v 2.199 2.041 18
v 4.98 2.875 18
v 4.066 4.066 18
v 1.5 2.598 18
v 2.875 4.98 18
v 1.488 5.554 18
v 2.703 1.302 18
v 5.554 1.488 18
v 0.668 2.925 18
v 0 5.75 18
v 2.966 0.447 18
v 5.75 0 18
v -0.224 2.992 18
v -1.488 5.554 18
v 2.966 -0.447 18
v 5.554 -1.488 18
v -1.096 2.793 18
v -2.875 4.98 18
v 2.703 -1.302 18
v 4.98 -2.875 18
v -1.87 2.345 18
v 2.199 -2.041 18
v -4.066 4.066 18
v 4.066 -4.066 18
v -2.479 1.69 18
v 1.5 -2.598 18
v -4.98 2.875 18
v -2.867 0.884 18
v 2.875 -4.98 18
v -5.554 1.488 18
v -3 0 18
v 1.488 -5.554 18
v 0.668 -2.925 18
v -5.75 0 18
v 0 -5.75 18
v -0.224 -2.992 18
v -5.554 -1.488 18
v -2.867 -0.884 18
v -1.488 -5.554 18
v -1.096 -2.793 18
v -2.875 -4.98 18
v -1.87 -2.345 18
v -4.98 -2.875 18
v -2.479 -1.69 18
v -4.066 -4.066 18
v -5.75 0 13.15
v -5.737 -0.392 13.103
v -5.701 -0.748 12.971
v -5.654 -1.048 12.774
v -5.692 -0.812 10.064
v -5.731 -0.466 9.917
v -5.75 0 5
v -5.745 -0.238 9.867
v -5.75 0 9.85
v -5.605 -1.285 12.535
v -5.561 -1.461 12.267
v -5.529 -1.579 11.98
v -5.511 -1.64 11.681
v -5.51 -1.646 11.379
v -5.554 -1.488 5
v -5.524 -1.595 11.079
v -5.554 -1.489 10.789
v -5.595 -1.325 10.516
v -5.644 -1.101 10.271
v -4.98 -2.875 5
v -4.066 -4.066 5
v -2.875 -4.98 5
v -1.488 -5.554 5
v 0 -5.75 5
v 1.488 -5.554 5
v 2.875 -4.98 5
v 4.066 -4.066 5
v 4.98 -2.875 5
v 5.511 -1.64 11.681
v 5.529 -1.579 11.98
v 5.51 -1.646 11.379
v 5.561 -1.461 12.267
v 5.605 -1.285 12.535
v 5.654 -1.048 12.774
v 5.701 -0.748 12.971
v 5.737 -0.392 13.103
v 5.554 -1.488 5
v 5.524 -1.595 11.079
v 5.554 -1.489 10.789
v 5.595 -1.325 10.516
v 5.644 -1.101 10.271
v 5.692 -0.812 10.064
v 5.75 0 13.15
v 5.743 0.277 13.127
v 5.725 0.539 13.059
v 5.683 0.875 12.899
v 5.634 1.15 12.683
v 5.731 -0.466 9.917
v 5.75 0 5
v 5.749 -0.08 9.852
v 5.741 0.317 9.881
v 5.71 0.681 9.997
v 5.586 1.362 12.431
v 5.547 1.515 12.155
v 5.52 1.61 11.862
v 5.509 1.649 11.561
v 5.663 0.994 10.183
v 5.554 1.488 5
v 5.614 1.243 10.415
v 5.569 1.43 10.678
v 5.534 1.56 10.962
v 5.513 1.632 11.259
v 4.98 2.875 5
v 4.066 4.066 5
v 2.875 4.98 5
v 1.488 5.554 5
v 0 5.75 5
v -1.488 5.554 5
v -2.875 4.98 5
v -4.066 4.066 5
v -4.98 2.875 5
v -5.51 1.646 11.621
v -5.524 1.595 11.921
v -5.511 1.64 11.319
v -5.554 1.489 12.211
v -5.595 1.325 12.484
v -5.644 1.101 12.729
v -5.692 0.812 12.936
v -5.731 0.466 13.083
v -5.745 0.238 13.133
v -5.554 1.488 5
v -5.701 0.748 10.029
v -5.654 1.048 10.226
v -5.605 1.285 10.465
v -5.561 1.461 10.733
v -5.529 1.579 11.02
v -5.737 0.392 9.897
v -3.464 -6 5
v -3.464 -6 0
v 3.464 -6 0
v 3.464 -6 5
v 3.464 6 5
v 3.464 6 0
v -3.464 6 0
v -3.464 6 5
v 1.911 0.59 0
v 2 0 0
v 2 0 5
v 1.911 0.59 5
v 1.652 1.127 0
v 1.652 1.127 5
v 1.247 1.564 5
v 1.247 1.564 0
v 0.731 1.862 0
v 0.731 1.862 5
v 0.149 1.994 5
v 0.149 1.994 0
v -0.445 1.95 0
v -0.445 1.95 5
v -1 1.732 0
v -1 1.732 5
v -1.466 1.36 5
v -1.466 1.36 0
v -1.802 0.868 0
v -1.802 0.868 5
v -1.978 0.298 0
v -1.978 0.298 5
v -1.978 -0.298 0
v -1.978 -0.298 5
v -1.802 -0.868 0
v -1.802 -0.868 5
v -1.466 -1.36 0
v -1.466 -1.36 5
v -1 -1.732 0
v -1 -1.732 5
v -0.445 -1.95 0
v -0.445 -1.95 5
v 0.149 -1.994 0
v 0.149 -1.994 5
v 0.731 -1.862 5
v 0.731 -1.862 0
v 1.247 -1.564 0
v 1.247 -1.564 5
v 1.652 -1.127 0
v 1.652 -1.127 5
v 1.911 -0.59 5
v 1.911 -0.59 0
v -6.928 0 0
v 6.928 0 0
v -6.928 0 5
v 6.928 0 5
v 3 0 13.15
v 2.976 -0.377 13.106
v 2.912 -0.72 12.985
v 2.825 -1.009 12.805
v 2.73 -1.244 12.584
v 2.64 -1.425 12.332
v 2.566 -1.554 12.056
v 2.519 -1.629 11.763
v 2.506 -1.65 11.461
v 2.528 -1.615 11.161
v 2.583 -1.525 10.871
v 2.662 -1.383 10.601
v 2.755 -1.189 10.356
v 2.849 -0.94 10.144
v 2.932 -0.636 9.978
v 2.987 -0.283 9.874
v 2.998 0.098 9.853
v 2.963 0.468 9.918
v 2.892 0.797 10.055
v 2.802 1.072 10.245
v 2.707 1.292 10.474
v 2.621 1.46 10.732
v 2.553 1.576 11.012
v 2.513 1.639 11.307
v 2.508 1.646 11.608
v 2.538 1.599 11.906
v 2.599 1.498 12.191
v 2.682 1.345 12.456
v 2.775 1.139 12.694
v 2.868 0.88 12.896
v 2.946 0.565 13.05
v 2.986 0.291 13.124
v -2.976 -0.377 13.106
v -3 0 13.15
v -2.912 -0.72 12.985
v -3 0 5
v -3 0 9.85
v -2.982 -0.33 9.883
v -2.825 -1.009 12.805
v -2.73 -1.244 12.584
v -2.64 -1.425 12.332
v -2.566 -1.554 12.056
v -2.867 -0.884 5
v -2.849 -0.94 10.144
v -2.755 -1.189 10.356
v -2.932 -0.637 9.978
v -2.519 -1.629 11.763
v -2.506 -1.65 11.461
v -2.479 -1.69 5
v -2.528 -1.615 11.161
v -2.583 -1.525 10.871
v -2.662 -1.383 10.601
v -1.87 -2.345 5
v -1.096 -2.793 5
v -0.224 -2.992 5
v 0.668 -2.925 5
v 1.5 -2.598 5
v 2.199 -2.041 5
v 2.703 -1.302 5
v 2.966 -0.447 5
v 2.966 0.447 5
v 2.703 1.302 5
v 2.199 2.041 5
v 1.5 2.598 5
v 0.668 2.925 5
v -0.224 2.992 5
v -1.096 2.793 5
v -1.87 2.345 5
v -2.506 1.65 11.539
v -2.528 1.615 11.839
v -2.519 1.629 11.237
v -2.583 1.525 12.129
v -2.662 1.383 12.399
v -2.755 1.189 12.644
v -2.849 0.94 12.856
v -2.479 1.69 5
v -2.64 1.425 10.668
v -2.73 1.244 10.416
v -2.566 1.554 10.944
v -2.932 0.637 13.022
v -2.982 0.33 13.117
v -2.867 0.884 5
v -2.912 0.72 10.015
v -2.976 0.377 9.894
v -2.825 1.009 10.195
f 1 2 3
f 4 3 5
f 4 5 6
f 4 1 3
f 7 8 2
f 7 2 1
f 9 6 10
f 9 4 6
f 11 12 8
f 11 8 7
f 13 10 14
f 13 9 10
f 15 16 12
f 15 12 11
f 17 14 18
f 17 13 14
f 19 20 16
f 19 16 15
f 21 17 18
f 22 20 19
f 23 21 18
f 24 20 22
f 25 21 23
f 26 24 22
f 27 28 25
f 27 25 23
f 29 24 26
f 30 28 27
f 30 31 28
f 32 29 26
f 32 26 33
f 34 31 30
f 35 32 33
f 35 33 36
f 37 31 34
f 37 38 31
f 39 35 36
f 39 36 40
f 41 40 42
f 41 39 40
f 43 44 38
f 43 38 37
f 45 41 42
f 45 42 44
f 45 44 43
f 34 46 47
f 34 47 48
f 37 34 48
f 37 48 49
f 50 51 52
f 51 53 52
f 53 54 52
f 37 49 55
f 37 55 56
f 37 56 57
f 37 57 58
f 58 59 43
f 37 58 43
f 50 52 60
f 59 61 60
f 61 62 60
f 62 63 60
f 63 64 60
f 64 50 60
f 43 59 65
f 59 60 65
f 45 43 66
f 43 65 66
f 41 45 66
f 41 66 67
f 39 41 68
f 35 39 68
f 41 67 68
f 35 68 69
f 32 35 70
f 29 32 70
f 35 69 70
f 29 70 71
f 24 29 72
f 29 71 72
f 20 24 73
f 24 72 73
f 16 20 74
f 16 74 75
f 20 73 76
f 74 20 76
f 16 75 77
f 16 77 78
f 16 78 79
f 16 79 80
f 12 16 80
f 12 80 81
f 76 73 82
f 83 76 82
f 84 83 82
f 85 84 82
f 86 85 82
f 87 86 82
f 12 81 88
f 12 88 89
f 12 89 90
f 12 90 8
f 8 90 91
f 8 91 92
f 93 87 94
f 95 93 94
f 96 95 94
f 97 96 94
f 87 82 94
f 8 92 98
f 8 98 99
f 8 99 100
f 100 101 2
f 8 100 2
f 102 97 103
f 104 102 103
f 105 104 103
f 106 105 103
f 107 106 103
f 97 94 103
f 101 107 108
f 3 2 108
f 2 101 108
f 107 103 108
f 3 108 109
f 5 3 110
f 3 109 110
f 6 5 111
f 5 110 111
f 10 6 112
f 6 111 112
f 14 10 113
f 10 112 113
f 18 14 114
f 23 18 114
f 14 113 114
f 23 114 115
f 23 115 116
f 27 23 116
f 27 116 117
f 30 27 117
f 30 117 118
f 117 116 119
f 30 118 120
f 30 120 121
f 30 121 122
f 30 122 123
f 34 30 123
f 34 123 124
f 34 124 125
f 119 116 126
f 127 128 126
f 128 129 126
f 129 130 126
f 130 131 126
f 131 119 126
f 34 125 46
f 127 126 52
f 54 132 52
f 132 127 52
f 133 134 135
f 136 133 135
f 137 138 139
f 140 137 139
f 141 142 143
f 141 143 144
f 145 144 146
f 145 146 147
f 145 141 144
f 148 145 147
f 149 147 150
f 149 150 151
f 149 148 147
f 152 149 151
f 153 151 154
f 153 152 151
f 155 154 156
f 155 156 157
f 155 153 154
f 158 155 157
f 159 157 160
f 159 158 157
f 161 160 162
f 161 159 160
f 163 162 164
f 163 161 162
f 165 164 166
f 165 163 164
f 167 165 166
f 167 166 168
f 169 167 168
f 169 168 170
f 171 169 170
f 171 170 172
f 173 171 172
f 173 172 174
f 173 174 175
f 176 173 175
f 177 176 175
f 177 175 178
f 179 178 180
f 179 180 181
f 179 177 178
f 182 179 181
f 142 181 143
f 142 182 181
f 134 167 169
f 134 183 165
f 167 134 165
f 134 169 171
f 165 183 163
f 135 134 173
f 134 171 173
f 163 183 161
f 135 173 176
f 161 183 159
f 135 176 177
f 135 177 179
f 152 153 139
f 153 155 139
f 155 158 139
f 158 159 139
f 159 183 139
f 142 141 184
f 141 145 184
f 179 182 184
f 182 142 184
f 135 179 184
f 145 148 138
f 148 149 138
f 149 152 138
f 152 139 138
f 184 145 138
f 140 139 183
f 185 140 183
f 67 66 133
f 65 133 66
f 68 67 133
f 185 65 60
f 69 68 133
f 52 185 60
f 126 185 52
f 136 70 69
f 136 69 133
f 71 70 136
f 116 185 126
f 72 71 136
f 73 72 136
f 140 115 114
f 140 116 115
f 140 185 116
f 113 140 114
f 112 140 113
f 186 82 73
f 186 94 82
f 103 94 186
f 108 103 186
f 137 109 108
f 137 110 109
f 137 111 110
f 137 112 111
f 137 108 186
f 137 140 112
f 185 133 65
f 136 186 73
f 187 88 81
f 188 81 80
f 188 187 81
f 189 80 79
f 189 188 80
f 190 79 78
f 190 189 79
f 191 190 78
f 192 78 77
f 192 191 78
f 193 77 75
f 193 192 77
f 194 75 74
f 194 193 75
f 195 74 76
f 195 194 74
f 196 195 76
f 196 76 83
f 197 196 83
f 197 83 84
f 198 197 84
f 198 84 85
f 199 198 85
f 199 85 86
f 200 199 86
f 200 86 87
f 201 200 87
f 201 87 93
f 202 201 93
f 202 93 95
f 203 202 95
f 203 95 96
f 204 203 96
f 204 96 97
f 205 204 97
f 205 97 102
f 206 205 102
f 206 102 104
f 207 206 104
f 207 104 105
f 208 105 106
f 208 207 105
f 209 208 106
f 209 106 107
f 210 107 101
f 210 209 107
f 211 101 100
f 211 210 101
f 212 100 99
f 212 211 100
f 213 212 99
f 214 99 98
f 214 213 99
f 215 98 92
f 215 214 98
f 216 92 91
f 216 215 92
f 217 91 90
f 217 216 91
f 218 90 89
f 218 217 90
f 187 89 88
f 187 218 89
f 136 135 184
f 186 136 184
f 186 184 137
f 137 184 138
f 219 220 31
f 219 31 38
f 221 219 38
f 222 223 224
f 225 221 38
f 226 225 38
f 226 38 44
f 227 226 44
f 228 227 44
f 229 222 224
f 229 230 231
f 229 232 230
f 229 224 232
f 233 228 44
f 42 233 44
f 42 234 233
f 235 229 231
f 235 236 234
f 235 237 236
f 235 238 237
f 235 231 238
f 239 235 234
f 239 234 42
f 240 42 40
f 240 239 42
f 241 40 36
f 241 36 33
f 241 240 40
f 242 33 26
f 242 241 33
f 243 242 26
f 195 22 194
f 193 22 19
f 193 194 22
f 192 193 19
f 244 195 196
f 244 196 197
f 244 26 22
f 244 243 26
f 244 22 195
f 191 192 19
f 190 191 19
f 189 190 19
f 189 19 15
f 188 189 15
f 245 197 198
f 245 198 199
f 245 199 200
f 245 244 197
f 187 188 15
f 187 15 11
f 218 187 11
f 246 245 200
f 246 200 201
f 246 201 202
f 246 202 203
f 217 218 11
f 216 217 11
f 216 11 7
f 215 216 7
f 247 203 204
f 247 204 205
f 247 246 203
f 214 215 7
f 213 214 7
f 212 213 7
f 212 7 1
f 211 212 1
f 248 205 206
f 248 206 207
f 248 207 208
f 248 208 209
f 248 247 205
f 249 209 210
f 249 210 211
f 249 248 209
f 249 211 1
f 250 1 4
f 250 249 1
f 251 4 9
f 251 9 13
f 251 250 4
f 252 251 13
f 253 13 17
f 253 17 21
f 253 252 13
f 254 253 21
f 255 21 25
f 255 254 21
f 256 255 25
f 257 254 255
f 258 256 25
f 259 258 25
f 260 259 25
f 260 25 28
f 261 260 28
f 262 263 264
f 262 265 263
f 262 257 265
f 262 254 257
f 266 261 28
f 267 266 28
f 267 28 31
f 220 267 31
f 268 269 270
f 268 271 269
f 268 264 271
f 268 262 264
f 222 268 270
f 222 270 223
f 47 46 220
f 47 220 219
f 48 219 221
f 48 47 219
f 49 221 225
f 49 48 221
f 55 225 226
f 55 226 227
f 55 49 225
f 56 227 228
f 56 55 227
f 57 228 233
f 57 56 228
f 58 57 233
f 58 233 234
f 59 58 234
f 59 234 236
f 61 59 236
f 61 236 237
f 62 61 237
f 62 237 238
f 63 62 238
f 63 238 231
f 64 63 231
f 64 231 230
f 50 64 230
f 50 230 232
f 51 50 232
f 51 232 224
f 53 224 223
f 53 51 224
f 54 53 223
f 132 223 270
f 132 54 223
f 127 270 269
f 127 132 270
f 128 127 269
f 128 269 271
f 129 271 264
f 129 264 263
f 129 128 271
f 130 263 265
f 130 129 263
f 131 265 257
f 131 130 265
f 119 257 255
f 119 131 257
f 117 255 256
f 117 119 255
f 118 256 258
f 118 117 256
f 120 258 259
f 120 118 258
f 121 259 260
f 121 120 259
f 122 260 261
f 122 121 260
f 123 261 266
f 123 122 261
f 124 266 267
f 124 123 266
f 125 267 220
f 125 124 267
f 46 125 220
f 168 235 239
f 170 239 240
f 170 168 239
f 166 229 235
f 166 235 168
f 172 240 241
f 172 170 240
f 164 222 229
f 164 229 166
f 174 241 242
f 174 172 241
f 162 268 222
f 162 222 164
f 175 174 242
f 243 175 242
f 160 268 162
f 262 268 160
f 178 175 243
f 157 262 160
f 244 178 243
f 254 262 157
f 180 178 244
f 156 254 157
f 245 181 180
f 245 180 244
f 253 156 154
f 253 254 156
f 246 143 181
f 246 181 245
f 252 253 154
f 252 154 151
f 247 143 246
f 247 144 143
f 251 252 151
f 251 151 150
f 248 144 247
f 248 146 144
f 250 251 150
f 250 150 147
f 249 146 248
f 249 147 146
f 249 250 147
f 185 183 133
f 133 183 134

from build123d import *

# Parameters (mm, degrees)
SKETCH_1_R                = 2
F_12MM_5_M4_DEPTH         = 5
EXTRUDE_START             = 5
SKETCH_2_R                = 5.75
SKETCH_2_R_2              = 3
EXTRUDE_11_5_6_13_DEPTH   = 13
CUT_EXTRUDE_M4_DEPTH      = 21.199009877
CUT_EXTRUDE_M4_DEPTH_BACK = 21.199009877
SKETCH_3_R                = 1.65


with BuildPart() as part:
    # 草图1 → 轮毂端六角12mm_厚5_中心M4孔简化 (new body)
    with BuildSketch(Plane.XY):
        Polygon((6.92820323, 0), (3.464101615, 6), (-3.464101615, 6), (-6.92820323, 0), (-3.464101615, -6), (3.464101615, -6), align=None)
        Circle(SKETCH_1_R, mode=Mode.SUBTRACT)
    extrude(amount=F_12MM_5_M4_DEPTH)

    # 草图2 → 电机端_外径11.5_孔径6_长13 (add)
    with BuildSketch(Plane.XY.offset(EXTRUDE_START)):
        with Locations(Location((0, 0, 0), (0, 0, 180))):
            Circle(SKETCH_2_R)
        with Locations(Location((0, 0, 0), (0, 0, 180))):
            Circle(SKETCH_2_R_2, mode=Mode.SUBTRACT)
    extrude(amount=EXTRUDE_11_5_6_13_DEPTH)

    # 草图3 → M4紧定螺钉底孔_牙型简化 (cut, two sides: drawn at the far end of the back side and taken through both)
    with BuildSketch(Plane(origin=(0, 0, 0), x_dir=(0, 0, -1), z_dir=(1, 0, 0)).offset(-CUT_EXTRUDE_M4_DEPTH_BACK)):
        with Locations(Location((-11.5, 0, 0), (0, 0, 180))):
            Circle(SKETCH_3_R)
    extrude(amount=CUT_EXTRUDE_M4_DEPTH + CUT_EXTRUDE_M4_DEPTH_BACK, mode=Mode.SUBTRACT)


solid = part.part
